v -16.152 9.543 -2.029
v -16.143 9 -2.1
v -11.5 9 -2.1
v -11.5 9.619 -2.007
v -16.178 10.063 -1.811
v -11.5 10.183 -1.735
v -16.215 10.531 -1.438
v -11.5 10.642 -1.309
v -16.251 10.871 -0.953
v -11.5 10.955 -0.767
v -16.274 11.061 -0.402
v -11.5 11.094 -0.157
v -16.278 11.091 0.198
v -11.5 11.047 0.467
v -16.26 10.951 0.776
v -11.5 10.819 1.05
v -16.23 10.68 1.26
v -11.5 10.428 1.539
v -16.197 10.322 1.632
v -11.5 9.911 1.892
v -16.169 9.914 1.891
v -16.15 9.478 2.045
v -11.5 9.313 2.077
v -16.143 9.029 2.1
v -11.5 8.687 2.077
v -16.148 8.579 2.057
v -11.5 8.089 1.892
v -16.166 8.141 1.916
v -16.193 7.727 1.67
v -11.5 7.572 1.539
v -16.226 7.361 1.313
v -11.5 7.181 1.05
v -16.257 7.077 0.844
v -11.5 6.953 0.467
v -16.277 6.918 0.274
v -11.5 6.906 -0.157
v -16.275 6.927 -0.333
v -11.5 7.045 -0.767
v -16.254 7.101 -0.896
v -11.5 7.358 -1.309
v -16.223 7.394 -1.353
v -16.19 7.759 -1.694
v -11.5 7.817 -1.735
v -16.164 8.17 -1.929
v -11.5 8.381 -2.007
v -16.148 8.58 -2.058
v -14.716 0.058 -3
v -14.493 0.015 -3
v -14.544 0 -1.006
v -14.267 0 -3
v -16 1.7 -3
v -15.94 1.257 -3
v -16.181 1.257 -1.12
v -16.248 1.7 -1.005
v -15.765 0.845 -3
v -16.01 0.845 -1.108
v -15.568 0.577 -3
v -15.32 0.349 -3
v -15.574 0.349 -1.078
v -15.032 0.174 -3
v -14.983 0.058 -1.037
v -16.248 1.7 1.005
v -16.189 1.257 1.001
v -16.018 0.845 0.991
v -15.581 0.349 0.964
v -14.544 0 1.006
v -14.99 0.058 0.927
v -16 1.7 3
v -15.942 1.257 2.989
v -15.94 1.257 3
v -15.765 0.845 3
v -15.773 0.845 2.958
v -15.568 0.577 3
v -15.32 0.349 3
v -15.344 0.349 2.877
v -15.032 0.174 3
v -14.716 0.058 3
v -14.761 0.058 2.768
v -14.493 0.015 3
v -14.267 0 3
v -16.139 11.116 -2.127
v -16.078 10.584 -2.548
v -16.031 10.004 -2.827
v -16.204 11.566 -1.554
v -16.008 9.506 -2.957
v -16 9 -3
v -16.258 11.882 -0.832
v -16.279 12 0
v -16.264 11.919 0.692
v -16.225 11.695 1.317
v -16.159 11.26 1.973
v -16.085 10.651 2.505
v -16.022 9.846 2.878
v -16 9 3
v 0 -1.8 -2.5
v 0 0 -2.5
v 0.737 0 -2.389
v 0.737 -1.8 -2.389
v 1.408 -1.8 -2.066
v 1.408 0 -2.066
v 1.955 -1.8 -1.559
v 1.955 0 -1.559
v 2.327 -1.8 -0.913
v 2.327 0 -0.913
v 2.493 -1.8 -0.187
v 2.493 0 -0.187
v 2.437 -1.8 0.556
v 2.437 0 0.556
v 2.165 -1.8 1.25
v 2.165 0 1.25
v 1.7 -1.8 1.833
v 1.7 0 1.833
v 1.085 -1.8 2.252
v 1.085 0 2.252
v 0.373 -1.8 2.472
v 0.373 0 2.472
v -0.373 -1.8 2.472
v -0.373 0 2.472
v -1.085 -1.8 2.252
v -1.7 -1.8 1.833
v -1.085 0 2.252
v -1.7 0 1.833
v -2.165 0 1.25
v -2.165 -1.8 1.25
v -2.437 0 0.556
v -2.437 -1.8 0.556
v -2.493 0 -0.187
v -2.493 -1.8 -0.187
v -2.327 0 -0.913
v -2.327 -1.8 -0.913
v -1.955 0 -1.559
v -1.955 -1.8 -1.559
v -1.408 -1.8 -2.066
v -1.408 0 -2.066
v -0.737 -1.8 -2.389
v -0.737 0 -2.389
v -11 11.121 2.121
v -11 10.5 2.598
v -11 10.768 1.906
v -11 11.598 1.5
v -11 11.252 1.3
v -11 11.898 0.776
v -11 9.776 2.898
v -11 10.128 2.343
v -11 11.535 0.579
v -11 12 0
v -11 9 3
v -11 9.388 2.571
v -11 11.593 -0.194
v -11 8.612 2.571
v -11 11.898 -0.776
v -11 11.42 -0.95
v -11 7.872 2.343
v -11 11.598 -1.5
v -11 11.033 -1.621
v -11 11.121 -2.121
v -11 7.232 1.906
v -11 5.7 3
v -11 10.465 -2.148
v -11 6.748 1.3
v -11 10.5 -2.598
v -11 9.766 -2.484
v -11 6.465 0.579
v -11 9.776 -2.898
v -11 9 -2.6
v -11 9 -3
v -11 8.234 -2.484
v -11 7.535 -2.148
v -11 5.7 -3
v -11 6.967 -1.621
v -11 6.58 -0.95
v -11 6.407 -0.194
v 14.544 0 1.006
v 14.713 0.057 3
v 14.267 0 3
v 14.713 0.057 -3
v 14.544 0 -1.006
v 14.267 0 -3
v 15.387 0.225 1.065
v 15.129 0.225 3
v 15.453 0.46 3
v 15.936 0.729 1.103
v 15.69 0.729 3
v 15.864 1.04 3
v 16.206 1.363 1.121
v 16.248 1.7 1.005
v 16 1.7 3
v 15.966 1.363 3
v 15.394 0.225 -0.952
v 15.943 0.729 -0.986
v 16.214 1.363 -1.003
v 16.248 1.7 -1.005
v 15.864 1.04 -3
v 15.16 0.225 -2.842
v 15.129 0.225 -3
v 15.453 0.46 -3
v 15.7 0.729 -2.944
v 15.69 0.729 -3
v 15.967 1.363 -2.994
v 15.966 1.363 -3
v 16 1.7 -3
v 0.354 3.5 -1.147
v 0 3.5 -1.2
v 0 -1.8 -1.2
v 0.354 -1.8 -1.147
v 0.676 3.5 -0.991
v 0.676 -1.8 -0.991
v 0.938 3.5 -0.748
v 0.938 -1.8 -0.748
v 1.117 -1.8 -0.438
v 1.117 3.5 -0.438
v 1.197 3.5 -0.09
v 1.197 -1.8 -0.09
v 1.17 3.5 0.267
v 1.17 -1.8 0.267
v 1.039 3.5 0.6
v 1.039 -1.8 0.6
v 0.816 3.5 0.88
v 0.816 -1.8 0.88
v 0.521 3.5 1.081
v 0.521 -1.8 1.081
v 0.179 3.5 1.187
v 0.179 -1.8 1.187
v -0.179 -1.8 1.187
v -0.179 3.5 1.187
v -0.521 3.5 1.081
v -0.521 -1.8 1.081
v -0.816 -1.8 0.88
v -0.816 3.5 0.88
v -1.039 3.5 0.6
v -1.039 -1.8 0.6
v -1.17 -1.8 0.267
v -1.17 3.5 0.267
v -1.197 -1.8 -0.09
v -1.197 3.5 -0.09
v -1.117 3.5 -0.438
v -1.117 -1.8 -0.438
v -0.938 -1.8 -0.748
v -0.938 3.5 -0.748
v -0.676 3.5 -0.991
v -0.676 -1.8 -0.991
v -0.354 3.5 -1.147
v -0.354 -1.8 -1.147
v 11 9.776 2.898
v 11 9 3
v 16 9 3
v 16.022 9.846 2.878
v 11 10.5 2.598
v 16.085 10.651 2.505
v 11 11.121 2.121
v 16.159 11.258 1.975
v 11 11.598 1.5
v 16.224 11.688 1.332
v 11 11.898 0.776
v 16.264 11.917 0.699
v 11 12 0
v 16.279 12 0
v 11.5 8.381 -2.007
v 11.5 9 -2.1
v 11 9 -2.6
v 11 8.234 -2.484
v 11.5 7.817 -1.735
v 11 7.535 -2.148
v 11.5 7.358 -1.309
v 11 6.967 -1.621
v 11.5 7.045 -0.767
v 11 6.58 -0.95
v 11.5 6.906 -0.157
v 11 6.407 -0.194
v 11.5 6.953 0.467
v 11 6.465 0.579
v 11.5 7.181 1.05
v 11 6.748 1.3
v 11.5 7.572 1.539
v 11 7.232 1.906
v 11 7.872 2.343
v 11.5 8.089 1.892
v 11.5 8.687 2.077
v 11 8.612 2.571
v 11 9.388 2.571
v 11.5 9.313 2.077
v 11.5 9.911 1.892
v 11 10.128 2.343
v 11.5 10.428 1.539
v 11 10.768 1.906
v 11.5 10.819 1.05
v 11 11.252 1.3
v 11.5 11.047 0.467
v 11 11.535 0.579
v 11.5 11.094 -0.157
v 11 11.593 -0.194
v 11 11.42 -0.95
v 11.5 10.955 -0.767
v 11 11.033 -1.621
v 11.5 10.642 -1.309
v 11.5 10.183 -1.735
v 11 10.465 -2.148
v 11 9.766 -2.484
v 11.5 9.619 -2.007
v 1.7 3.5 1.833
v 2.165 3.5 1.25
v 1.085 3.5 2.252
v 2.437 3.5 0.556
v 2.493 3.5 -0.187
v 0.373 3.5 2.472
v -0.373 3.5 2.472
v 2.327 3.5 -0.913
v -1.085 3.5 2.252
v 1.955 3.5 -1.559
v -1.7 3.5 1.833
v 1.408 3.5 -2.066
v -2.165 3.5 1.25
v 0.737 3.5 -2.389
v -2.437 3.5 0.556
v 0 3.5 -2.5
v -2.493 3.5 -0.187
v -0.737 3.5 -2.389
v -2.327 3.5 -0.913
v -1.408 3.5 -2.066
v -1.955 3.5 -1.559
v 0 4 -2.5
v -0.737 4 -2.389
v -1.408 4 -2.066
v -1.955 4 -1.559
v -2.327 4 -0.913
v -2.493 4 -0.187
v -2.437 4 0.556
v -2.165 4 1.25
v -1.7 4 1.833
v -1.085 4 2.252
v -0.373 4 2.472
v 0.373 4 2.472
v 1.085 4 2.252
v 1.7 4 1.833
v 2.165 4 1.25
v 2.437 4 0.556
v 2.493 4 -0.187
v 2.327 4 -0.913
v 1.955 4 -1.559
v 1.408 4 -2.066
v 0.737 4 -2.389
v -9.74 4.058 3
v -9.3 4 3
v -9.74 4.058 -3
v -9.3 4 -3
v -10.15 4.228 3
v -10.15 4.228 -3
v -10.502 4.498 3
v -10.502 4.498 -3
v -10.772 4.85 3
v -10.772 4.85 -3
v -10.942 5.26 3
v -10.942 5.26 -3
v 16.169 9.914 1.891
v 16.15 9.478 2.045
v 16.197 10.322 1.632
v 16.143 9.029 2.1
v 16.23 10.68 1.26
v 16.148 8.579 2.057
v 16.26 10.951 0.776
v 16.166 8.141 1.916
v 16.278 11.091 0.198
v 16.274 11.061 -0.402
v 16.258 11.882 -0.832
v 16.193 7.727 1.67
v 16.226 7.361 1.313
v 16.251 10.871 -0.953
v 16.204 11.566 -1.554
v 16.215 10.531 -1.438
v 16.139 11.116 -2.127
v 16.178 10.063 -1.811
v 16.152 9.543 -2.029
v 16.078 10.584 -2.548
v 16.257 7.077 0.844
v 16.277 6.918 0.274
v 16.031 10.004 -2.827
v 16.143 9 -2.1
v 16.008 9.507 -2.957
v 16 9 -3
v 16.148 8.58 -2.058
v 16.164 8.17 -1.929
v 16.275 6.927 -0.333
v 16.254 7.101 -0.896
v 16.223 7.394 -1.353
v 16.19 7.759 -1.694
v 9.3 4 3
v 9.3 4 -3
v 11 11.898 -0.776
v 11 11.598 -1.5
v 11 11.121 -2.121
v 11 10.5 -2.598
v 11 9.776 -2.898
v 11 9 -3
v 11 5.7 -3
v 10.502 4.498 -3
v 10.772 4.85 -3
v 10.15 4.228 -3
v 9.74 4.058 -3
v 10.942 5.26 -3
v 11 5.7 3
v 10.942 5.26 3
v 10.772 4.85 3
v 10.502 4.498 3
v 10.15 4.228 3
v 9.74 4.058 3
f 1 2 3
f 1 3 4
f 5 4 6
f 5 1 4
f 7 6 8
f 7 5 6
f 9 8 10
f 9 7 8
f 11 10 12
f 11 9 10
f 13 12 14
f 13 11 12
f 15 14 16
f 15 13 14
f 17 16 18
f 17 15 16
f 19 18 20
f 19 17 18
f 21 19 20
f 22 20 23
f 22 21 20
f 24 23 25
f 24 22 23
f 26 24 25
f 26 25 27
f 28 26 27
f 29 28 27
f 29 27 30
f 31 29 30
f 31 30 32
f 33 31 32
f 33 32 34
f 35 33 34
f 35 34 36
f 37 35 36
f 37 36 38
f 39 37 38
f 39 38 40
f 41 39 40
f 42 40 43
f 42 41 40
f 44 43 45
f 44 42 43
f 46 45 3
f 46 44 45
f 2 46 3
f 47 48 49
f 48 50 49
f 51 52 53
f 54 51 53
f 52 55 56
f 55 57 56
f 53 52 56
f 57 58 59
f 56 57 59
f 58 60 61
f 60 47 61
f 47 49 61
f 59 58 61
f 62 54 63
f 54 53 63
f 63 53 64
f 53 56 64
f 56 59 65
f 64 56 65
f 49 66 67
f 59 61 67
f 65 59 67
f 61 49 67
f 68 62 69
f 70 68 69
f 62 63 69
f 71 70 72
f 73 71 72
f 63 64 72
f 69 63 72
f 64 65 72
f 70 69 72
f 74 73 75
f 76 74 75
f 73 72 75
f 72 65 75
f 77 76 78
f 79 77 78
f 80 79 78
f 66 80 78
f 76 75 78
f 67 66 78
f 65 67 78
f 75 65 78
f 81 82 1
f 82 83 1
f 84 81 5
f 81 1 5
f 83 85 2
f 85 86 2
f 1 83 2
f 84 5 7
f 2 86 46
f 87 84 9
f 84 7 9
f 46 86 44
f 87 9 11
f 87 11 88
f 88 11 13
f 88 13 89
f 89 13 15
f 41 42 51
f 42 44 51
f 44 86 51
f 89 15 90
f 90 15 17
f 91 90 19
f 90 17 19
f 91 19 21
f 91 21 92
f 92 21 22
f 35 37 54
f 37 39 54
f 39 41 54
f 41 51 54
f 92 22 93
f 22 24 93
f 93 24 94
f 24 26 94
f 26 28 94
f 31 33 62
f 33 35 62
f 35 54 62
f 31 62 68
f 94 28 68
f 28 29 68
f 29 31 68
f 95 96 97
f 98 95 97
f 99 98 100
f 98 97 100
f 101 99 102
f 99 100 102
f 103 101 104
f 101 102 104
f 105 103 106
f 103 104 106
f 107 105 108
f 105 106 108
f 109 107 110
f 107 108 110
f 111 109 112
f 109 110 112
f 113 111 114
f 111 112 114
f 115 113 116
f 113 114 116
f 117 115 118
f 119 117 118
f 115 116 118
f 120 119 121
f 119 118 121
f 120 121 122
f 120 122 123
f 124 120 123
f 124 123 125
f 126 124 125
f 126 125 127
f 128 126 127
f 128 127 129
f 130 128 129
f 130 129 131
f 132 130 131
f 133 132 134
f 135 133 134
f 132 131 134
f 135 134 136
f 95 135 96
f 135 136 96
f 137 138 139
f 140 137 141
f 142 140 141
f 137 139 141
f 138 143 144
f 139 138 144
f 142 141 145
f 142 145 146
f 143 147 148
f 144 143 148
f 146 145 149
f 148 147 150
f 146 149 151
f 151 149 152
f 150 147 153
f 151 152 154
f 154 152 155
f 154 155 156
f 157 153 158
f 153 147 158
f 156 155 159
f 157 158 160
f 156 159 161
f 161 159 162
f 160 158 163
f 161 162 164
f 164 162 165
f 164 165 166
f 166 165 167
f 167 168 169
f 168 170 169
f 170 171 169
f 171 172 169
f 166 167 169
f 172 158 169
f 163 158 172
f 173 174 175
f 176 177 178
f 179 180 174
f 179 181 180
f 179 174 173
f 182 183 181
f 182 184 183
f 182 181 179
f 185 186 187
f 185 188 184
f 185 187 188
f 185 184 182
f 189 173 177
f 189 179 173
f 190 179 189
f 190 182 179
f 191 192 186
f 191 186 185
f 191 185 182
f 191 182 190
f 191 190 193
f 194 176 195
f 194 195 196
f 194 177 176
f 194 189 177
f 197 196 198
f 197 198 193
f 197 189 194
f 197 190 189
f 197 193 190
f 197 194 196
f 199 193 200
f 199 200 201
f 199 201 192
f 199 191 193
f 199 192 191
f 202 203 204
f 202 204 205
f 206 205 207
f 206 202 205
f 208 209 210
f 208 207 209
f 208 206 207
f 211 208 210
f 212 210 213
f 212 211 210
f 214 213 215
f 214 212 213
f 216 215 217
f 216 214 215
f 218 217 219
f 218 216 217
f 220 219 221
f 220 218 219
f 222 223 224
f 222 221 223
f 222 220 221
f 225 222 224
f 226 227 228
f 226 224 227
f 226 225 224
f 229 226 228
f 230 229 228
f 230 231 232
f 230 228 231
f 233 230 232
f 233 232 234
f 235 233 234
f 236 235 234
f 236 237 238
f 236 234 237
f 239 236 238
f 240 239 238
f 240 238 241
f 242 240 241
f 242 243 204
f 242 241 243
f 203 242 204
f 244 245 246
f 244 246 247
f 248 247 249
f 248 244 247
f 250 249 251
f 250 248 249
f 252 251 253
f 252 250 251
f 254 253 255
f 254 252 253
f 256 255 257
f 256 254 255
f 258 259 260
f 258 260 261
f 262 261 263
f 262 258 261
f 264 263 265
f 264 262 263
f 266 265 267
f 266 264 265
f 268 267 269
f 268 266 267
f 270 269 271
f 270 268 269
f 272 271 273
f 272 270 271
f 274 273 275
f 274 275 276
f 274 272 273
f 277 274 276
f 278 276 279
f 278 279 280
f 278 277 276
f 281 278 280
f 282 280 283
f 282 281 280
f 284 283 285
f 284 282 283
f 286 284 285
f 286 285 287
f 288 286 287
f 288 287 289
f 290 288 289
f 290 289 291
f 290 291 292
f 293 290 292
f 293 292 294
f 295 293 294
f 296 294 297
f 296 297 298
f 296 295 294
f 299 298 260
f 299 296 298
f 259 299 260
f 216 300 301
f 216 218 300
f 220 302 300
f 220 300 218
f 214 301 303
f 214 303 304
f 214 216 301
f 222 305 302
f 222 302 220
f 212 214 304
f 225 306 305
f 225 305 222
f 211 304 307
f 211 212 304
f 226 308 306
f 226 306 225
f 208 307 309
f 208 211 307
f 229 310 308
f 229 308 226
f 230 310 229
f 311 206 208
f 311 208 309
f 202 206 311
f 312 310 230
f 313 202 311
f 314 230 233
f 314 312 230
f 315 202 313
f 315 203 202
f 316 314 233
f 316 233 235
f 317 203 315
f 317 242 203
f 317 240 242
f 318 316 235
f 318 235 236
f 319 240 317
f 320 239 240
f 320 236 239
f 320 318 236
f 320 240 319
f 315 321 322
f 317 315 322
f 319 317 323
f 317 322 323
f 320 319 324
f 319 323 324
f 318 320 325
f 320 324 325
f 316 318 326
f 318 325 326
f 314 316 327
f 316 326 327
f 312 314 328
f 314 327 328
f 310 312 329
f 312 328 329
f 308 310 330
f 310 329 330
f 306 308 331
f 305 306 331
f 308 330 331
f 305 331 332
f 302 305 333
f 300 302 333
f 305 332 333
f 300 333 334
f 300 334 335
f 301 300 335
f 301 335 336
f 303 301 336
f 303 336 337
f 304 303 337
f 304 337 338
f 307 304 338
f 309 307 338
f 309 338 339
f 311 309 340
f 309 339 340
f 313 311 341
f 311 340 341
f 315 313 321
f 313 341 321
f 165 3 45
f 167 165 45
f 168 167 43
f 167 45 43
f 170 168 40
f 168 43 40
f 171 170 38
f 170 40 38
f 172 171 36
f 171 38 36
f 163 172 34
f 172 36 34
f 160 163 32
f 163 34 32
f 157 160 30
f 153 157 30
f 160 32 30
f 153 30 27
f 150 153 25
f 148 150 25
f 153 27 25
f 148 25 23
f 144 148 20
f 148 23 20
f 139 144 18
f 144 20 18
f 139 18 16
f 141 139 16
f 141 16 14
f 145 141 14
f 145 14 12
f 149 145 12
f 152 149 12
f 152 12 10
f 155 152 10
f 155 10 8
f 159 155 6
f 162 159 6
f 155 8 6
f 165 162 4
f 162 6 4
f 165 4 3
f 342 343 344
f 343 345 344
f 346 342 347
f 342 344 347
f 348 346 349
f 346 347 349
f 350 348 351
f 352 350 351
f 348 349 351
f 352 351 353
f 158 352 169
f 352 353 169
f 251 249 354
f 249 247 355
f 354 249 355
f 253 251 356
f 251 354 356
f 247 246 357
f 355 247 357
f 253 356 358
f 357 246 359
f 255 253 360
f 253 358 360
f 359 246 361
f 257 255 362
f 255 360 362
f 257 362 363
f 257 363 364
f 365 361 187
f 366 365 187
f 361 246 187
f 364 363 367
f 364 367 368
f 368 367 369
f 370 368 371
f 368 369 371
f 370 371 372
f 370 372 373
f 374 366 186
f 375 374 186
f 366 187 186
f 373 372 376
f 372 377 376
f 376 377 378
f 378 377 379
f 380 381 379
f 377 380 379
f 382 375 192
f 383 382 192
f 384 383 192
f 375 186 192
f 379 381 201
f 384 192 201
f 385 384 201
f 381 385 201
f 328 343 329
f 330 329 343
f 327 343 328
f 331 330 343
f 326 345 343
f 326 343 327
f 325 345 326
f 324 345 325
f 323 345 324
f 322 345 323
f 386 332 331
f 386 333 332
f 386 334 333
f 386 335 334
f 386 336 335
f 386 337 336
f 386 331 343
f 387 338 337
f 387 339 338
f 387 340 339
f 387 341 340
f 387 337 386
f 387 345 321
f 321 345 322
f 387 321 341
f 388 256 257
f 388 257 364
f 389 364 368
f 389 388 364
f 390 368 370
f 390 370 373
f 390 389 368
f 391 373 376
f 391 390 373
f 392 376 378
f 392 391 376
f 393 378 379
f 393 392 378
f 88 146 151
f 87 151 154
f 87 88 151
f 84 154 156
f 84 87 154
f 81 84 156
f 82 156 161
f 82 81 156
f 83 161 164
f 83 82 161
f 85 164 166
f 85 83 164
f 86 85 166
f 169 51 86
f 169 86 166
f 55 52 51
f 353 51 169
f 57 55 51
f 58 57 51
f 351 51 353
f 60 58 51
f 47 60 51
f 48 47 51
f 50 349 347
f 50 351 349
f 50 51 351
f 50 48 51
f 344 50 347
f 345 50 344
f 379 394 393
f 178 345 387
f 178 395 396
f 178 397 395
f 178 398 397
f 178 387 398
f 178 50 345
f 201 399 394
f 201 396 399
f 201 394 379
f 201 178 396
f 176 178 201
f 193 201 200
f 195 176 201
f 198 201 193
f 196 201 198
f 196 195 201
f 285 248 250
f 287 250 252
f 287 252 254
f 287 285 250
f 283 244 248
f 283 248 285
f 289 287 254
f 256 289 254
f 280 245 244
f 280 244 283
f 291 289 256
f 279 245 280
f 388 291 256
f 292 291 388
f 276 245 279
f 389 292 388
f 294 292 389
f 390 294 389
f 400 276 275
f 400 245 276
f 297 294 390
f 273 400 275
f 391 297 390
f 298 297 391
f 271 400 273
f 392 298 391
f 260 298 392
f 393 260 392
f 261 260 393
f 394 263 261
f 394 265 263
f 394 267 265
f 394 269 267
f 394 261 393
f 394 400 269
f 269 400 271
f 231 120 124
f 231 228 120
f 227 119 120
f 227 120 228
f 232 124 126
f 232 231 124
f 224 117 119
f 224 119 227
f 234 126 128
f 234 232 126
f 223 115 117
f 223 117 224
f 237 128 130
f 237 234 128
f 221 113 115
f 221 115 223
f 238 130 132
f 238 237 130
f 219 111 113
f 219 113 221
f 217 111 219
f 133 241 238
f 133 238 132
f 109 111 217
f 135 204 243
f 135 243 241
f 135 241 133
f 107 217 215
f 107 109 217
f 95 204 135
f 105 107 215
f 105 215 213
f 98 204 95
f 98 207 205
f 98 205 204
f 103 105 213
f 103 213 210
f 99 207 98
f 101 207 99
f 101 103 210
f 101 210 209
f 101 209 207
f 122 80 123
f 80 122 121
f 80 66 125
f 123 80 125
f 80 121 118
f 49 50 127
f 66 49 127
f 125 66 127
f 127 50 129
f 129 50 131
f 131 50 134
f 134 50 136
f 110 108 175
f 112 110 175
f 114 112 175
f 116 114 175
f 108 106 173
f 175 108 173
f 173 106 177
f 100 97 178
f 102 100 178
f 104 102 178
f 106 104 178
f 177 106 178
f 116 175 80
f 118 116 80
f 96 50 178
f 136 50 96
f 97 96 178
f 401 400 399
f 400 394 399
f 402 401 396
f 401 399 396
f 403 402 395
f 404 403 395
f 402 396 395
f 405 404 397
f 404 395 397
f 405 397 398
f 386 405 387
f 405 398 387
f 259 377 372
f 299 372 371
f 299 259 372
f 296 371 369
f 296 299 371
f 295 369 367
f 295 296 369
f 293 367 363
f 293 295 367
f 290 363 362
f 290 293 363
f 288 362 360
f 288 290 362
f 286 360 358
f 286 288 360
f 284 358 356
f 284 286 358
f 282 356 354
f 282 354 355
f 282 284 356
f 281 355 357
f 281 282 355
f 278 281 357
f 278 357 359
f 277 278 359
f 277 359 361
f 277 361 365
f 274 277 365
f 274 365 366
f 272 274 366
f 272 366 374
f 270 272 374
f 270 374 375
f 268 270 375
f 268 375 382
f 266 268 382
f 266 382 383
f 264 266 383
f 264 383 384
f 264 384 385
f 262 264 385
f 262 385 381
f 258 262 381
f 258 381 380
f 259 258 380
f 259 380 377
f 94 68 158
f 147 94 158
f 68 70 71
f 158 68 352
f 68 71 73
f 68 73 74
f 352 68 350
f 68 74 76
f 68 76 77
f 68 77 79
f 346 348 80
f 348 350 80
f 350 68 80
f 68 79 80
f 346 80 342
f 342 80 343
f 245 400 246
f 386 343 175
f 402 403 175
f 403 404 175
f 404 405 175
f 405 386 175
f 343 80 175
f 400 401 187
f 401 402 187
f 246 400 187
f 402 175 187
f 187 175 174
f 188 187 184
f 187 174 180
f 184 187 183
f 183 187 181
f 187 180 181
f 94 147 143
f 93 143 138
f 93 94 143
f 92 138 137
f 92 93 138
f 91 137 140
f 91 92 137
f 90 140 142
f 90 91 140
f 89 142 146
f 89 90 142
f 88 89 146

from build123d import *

# Parameters (mm, degrees)
SKETCH1_W               = 5
SKETCH1_H               = 6
SKETCH1_W_2             = 22
BOSS_EXTRUDE1_DEPTH     = 4
BOSS_EXTRUDE2_START     = 4
SKETCH1_3_W             = 5
SKETCH1_3_H             = 6
BOSS_EXTRUDE2_DEPTH     = 8
CUT_EXTRUDE1_DEPTH      = 30.952196132
CUT_EXTRUDE1_DEPTH_BACK = 30.952196132
SKETCH2_R               = 2.1
SKETCH4_R               = 2.5
BOSS_EXTRUDE3_DEPTH     = 1.8
CUT_EXTRUDE2_DEPTH      = 22.550870206
CUT_EXTRUDE2_DEPTH_BACK = 22.550870206
SKETCH5_R               = 1.2
SKETCH6_R               = 2.5
CUT_EXTRUDE3_DEPTH      = 0.5
CHAMFER1_SIZE           = 0.5
FILLET1_R               = 1.7


with BuildPart() as part:
    # Sketch1 → Boss-Extrude1 (new body)
    with BuildSketch(Plane(origin=(0, 0, 0), x_dir=(1, 0, 0), z_dir=(0, 1, 0))):
        with Locations((-13.5, 0)):
            Rectangle(SKETCH1_W, SKETCH1_H)
        Rectangle(SKETCH1_W_2, SKETCH1_H)
        with Locations((13.5, 0)):
            Rectangle(SKETCH1_W, SKETCH1_H)
        with BuildLine():
            Line((-16, -3), (-16, 3))
            ThreePointArc((-16, 3), (-16.278820596, 0), (-16, -3))
        make_face()
        with BuildLine():
            ThreePointArc((16.278820596, 0), (16.208965568, 1.506464481), (16, 3))
            Line((16, 3), (16, -3))
            ThreePointArc((16, -3), (16.208965568, -1.506464481), (16.278820596, 0))
        make_face()
    extrude(amount=BOSS_EXTRUDE1_DEPTH)

    # Sketch1<3> → Boss-Extrude2 (add)
    with BuildSketch(Plane(origin=(0, 0, 0), x_dir=(1, 0, 0), z_dir=(0, 1, 0)).offset(BOSS_EXTRUDE2_START)):
        with Locations((-13.5, 0)):
            Rectangle(SKETCH1_3_W, SKETCH1_3_H)
        with BuildLine():
            Line((-16, -3), (-16, 3))
            ThreePointArc((-16, 3), (-16.278820596, 0), (-16, -3))
        make_face()
        with Locations((13.5, 0)):
            Rectangle(SKETCH1_3_W, SKETCH1_3_H)
        with BuildLine():
            ThreePointArc((16.278820596, 0), (16.208965568, 1.506464481), (16, 3))
            Line((16, 3), (16, -3))
            ThreePointArc((16, -3), (16.208965568, -1.506464481), (16.278820596, 0))
        make_face()
    extrude(amount=BOSS_EXTRUDE2_DEPTH)

    # Sketch2 → Cut-Extrude1 (cut, two sides: drawn at the far end of the back side and taken through both)
    with BuildSketch(Plane(origin=(-11, 0, 0), x_dir=(0, 0, -1), z_dir=(1, 0, 0)).offset(-CUT_EXTRUDE1_DEPTH_BACK)):
        with BuildLine():
            Line((3, 12), (0, 12))
            ThreePointArc((0, 12), (2.121320344, 11.121320344), (3, 9))
            Line((3, 9), (3, 12))
        make_face()
        with BuildLine():
            Line((-3, 12), (-3, 9))
            ThreePointArc((-3, 9), (-2.121320344, 11.121320344), (0, 12))
            Line((0, 12), (-3, 12))
        make_face()
        with Locations((0, 9)):
            Circle(SKETCH2_R)
    extrude(amount=CUT_EXTRUDE1_DEPTH + CUT_EXTRUDE1_DEPTH_BACK, mode=Mode.SUBTRACT)

    # Sketch4 → Boss-Extrude3 (add)
    with BuildSketch(Plane.XZ):
        with Locations(Location((0, 0, 0), (0, 0, 270))):
            Circle(SKETCH4_R)
    extrude(amount=BOSS_EXTRUDE3_DEPTH)

    # Sketch5 → Cut-Extrude2 (cut, two sides: drawn at the far end of the back side and taken through both)
    with BuildSketch(Plane.XZ.offset(1.8).offset(-CUT_EXTRUDE2_DEPTH_BACK)):
        with Locations(Location((0, 0, 0), (0, 0, 270))):
            Circle(SKETCH5_R)
    extrude(amount=CUT_EXTRUDE2_DEPTH + CUT_EXTRUDE2_DEPTH_BACK, mode=Mode.SUBTRACT)

    # Sketch6 → Cut-Extrude3 (cut)
    with BuildSketch(Plane(origin=(0, 4, 0), x_dir=(1, 0, 0), z_dir=(0, 1, 0))):
        with Locations(Location((0, 0, 0), (0, 0, 90))):
            Circle(SKETCH6_R)
    extrude(amount=-CUT_EXTRUDE3_DEPTH, mode=Mode.SUBTRACT)

    # Chamfer1
    chamfer1_edges = [part.edges().sort_by_distance(p)[0] for p in [
        (11, 9, 2.1),
        (-11, 9, 2.1),
    ]]
    chamfer(chamfer1_edges, length=CHAMFER1_SIZE)

    # Fillet1
    fillet1_edges = [part.edges().sort_by_distance(p)[0] for p in [
        (-11, 4, 0),
        (11, 4, 0),
        (-16.278820596, 0, 0),
        (16.278820596, 0, 0),
    ]]
    fillet(fillet1_edges, radius=FILLET1_R)


solid = part.part
